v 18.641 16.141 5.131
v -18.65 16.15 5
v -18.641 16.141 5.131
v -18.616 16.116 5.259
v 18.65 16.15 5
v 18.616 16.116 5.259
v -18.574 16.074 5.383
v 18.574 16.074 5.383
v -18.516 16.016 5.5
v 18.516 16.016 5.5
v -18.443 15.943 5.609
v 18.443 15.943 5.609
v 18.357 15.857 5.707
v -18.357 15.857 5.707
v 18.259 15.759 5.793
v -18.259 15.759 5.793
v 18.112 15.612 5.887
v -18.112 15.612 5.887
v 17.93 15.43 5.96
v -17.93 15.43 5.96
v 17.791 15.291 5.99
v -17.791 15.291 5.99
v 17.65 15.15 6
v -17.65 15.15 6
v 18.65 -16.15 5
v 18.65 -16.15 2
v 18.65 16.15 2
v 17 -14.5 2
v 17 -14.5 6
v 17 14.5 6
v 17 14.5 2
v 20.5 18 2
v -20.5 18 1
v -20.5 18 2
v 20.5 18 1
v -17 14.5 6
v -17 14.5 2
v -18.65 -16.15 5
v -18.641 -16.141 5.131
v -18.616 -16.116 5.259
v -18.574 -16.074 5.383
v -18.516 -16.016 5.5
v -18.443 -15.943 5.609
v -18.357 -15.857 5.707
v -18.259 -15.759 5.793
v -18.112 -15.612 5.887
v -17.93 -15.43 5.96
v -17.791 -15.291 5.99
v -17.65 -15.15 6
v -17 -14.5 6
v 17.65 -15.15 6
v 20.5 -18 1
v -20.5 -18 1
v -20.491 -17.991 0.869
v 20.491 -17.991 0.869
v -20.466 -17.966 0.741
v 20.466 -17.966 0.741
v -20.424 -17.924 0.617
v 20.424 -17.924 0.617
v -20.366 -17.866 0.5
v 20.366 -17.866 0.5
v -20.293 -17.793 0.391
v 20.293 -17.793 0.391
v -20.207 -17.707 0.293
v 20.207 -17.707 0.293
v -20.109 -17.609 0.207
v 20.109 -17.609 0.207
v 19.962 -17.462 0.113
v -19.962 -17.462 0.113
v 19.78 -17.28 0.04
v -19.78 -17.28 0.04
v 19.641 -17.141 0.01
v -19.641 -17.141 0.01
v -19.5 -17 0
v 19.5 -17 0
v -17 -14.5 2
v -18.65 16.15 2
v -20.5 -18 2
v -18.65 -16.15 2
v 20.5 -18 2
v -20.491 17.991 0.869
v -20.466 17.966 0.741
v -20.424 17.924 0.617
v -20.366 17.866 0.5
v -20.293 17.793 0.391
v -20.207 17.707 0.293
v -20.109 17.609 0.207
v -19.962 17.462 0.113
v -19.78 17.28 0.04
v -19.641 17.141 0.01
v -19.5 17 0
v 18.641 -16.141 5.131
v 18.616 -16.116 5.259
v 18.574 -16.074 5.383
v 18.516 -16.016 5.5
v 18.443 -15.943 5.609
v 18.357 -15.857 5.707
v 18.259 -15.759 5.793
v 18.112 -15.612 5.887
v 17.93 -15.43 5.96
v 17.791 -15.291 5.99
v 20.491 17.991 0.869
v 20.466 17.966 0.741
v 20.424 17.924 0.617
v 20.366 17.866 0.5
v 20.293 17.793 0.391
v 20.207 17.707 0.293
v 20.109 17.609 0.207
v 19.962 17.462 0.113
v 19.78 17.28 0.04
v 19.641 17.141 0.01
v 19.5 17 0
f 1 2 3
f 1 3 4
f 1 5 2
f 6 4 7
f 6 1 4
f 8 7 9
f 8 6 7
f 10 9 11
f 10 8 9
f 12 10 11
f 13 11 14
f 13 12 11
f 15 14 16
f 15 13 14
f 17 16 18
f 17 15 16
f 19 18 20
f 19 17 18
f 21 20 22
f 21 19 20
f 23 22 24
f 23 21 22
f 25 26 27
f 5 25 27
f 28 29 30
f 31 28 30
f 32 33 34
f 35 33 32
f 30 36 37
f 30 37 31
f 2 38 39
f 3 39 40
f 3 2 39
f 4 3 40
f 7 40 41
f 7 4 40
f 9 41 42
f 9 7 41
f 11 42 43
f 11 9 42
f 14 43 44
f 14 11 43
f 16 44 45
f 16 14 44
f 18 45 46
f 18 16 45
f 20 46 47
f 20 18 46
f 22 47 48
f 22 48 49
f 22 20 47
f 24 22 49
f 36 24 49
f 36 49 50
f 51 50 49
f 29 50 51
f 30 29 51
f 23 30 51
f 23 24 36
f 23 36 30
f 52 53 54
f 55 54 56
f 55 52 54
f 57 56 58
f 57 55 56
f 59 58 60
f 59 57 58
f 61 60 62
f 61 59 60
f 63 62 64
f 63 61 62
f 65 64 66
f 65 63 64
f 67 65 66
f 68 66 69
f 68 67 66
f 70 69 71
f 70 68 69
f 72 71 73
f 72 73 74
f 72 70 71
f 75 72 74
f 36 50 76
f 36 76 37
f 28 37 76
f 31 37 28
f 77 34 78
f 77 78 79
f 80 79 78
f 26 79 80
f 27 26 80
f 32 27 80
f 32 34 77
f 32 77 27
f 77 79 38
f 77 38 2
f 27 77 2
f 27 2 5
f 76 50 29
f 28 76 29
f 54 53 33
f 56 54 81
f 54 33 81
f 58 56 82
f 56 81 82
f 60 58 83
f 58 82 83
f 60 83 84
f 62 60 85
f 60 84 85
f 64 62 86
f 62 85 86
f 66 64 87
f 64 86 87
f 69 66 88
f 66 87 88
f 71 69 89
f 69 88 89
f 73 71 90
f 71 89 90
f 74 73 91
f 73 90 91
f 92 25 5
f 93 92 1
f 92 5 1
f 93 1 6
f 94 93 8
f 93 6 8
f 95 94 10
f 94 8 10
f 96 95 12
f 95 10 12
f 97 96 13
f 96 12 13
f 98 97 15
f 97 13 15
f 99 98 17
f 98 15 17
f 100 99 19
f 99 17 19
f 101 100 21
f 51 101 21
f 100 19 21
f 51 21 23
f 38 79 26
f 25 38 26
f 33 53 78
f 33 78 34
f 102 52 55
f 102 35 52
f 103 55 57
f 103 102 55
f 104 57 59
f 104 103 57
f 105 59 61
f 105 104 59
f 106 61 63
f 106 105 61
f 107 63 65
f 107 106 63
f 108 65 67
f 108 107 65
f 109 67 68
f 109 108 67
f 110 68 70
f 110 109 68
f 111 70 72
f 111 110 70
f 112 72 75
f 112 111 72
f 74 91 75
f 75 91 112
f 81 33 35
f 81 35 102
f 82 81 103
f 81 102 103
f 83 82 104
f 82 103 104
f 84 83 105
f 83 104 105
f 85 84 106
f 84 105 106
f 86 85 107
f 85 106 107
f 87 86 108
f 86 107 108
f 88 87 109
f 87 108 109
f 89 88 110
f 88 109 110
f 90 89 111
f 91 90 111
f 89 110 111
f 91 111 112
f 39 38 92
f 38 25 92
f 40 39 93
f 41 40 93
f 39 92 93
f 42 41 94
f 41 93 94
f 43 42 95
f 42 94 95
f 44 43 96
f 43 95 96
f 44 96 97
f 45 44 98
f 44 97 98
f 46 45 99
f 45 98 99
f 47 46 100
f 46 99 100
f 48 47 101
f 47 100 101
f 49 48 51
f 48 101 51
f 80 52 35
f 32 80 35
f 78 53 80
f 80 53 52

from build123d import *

# Parameters (mm, degrees)
SKETCH_W     = 41
SKETCH_H     = 36
PAD_DEPTH    = 2
SKETCH001_W  = 37.3
SKETCH001_H  = 32.3
PAD001_DEPTH = 4
SKETCH002_W  = 34
SKETCH002_H  = 29
POCKET_DEPTH = 4
FILLET_R     = 1
FILLET001_R  = 1


with BuildPart() as part:
    # Sketch → Pad (new body)
    with BuildSketch(Plane.XY):
        Rectangle(SKETCH_W, SKETCH_H)
    extrude(amount=PAD_DEPTH)

    # Sketch001 (on Face6 of Pad) → Pad001 (join)
    with BuildSketch(Plane.XY.offset(2)):
        Rectangle(SKETCH001_W, SKETCH001_H)
    extrude(amount=PAD001_DEPTH)

    # Sketch002 (on Face11 of Pad001) → Pocket (cut)
    with BuildSketch(Plane.XY.offset(6)):
        Rectangle(SKETCH002_W, SKETCH002_H)
    extrude(amount=-POCKET_DEPTH, mode=Mode.SUBTRACT)

    # Fillet
    fillet_edges = [part.edges().sort_by_distance(p)[0] for p in [
        (0, 16.15, 6),
        (18.65, 0, 6),
        (0, -16.15, 6),
        (-18.65, 0, 6),
    ]]
    fillet(fillet_edges, radius=FILLET_R)

    # Fillet001
    fillet001_edges = [part.edges().sort_by_distance(p)[0] for p in [
        (0, 18, 0),
        (20.5, 0, 0),
        (0, -18, 0),
        (-20.5, 0, 0),
    ]]
    fillet(fillet001_edges, radius=FILLET001_R)


solid = part.part
